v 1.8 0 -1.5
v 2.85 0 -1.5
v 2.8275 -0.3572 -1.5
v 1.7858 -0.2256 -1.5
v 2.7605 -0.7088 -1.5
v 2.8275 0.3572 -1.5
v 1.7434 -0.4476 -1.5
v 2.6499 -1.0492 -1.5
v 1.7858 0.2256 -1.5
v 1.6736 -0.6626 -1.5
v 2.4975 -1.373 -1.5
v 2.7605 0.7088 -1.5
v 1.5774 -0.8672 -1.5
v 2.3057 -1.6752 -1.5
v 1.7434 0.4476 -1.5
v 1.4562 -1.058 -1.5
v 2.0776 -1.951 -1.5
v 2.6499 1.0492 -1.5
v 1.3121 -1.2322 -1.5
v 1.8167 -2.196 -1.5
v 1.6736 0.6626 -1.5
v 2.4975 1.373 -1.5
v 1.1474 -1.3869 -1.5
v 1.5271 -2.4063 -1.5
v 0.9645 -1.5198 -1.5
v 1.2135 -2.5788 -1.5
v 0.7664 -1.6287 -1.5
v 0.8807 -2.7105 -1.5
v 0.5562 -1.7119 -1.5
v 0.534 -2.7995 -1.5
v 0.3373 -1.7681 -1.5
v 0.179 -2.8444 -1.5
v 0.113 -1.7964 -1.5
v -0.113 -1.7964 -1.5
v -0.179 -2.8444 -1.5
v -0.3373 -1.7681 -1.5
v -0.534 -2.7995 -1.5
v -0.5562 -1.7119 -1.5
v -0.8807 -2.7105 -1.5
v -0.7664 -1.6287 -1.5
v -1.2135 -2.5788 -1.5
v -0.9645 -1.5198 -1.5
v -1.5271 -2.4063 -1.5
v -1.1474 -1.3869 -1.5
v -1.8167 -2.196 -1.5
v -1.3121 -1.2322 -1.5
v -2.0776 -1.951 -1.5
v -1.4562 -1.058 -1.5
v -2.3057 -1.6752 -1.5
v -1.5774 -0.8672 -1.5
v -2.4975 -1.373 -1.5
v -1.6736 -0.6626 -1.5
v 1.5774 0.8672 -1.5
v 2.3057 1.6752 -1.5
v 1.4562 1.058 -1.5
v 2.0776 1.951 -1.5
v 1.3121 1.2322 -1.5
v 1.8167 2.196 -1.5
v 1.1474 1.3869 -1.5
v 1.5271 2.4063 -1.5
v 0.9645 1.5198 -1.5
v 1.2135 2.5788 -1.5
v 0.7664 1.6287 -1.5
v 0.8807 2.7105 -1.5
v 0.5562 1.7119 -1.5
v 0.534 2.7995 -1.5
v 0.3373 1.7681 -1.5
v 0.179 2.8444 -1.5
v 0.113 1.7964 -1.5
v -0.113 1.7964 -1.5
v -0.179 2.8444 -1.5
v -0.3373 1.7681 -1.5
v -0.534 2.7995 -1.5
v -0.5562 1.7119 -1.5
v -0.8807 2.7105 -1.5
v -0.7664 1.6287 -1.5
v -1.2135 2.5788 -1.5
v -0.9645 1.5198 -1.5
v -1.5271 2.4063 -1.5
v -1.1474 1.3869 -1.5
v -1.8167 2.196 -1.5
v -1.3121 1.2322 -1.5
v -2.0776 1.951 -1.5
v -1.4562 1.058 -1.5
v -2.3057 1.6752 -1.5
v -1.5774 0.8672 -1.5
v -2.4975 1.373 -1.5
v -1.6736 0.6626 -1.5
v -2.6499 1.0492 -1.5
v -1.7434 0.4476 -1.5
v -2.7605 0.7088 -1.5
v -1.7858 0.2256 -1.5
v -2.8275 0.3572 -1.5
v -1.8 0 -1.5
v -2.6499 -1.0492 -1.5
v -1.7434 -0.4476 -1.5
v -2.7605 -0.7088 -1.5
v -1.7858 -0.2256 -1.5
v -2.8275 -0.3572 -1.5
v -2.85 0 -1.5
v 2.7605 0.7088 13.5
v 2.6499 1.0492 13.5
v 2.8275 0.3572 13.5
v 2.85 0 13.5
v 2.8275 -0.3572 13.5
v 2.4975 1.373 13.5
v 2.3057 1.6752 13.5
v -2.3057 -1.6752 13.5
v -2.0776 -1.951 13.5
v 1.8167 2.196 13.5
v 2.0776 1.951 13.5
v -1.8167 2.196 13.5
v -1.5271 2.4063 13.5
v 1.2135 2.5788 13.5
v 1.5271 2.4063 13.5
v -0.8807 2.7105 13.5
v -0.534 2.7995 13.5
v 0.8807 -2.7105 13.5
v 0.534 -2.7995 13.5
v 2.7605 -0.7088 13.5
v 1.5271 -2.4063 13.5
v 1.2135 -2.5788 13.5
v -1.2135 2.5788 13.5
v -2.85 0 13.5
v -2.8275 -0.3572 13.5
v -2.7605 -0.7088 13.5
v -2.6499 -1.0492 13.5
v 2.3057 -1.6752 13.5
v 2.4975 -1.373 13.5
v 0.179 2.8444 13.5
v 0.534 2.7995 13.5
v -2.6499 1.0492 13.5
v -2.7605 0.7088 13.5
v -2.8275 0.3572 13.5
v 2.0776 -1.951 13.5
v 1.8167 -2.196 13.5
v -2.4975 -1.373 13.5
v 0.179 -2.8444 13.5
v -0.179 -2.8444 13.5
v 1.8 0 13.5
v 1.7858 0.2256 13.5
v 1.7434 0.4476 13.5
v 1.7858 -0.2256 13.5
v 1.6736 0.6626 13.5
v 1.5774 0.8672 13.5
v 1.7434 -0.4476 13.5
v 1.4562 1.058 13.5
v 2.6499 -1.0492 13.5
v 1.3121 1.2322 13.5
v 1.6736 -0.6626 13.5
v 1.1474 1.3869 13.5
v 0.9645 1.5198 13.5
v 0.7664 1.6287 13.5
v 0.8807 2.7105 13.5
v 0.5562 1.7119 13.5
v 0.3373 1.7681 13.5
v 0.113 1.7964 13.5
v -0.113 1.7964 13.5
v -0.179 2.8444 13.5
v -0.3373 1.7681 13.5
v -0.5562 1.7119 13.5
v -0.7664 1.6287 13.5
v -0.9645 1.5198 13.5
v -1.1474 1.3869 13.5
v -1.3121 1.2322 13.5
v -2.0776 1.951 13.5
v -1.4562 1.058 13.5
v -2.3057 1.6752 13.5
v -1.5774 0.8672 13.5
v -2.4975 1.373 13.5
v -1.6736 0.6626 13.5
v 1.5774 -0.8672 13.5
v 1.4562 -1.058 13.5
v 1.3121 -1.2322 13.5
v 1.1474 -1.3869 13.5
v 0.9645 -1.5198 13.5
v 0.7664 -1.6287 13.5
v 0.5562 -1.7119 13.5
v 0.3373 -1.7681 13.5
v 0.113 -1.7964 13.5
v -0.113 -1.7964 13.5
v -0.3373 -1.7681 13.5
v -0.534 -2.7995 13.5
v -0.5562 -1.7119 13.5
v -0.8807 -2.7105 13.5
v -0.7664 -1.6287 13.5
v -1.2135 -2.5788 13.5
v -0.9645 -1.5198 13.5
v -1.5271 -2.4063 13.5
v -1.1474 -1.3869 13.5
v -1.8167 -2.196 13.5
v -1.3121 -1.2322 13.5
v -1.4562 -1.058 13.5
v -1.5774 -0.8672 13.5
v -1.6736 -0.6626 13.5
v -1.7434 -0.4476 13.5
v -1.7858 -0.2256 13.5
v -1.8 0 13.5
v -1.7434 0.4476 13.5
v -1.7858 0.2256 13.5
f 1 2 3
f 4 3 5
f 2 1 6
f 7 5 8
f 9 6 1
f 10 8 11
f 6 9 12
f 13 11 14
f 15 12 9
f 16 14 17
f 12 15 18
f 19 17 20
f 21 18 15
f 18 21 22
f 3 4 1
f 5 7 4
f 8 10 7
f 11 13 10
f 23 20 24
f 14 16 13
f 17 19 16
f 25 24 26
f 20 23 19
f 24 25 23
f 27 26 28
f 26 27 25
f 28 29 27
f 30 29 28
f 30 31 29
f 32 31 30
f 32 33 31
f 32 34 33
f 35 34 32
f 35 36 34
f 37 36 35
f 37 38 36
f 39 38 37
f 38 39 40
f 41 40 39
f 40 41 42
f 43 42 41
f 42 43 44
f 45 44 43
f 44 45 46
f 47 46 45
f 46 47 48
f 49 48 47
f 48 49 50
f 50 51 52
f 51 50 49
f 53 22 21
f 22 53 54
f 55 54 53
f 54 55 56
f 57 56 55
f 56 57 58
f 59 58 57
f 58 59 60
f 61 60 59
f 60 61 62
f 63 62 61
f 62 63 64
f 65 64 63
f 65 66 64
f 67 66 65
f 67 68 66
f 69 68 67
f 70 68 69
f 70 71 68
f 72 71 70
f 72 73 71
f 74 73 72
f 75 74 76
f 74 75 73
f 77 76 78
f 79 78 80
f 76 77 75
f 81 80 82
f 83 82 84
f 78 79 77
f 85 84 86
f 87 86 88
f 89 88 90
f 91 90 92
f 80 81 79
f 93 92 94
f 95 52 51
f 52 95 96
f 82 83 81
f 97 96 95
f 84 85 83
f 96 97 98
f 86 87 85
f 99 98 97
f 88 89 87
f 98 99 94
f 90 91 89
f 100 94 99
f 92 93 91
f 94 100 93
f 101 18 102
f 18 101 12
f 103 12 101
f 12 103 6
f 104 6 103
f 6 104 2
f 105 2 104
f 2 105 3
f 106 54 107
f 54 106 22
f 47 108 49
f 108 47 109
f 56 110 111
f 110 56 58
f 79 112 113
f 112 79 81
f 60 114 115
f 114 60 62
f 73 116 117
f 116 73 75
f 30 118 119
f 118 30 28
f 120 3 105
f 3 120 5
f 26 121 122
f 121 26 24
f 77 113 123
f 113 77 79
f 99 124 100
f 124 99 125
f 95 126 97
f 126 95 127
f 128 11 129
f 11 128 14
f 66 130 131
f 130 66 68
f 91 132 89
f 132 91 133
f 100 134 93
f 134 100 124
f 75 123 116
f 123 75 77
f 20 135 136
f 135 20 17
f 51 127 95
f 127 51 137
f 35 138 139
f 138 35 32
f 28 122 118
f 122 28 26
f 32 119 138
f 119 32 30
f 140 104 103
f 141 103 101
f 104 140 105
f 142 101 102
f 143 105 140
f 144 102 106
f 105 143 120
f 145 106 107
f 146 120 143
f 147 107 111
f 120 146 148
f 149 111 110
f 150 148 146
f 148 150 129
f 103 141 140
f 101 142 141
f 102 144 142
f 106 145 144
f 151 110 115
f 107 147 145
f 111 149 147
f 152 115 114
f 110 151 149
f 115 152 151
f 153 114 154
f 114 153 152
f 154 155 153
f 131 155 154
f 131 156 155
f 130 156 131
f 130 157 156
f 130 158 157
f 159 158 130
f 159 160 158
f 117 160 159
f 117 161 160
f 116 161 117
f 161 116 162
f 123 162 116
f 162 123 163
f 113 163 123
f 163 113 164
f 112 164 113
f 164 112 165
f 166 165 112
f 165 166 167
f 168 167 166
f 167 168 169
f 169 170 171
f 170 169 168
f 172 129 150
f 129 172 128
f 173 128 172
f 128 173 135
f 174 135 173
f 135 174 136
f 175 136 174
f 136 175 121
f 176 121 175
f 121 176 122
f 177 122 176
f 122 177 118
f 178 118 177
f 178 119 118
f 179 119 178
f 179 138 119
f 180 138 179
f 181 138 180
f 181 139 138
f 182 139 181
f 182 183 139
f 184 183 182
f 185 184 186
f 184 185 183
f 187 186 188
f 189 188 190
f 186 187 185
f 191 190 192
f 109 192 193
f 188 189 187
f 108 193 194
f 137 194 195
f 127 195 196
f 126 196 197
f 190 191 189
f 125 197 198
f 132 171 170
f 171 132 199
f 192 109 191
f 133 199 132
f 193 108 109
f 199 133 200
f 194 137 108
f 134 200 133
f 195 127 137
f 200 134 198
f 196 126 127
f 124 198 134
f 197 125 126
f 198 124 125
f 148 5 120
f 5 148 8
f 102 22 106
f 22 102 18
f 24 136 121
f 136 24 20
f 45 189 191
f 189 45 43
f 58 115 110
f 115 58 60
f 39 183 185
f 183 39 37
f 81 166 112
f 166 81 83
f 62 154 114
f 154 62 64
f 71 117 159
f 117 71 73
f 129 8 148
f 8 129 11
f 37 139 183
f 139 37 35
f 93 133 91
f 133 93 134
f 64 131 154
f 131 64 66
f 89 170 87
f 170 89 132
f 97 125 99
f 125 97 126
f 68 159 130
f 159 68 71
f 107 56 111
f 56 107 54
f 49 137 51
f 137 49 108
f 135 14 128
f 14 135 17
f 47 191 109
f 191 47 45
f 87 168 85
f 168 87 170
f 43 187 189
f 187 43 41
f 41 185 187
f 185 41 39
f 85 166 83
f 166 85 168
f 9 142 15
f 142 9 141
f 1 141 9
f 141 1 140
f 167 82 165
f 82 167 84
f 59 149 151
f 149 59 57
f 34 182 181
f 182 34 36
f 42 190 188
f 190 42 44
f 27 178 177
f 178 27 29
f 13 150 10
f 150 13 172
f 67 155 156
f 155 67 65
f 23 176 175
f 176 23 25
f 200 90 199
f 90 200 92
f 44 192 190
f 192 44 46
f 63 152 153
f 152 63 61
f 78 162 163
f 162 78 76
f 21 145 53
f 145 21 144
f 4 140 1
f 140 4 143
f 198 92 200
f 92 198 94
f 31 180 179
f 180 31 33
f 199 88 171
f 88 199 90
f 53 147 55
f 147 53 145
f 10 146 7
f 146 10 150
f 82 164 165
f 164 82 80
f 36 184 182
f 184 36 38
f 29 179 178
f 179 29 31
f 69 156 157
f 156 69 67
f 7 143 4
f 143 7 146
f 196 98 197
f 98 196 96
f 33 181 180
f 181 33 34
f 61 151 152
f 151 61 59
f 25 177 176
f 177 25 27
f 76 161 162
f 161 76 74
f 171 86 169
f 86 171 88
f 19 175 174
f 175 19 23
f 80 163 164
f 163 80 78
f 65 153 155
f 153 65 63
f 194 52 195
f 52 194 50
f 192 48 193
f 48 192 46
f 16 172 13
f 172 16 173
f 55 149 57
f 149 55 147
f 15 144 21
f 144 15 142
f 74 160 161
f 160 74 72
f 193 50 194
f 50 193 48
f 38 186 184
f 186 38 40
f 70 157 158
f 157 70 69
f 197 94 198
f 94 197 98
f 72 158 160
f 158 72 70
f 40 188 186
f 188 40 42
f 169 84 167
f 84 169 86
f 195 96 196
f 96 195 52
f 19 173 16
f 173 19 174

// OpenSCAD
$fn = 50;


difference() {
	union() {
		translate(v = [0, 0, -1.5000000000]) {
			cylinder(h = 3, r = 1.0000000000);
		}
		translate(v = [0, 0, -1.5000000000]) {
			cylinder(h = 15, r = 2.8500000000);
		}
	}
	union() {
		translate(v = [0, 0, -50.0000000000]) {
			cylinder(h = 100, r = 1.8000000000);
		}
	}
}
